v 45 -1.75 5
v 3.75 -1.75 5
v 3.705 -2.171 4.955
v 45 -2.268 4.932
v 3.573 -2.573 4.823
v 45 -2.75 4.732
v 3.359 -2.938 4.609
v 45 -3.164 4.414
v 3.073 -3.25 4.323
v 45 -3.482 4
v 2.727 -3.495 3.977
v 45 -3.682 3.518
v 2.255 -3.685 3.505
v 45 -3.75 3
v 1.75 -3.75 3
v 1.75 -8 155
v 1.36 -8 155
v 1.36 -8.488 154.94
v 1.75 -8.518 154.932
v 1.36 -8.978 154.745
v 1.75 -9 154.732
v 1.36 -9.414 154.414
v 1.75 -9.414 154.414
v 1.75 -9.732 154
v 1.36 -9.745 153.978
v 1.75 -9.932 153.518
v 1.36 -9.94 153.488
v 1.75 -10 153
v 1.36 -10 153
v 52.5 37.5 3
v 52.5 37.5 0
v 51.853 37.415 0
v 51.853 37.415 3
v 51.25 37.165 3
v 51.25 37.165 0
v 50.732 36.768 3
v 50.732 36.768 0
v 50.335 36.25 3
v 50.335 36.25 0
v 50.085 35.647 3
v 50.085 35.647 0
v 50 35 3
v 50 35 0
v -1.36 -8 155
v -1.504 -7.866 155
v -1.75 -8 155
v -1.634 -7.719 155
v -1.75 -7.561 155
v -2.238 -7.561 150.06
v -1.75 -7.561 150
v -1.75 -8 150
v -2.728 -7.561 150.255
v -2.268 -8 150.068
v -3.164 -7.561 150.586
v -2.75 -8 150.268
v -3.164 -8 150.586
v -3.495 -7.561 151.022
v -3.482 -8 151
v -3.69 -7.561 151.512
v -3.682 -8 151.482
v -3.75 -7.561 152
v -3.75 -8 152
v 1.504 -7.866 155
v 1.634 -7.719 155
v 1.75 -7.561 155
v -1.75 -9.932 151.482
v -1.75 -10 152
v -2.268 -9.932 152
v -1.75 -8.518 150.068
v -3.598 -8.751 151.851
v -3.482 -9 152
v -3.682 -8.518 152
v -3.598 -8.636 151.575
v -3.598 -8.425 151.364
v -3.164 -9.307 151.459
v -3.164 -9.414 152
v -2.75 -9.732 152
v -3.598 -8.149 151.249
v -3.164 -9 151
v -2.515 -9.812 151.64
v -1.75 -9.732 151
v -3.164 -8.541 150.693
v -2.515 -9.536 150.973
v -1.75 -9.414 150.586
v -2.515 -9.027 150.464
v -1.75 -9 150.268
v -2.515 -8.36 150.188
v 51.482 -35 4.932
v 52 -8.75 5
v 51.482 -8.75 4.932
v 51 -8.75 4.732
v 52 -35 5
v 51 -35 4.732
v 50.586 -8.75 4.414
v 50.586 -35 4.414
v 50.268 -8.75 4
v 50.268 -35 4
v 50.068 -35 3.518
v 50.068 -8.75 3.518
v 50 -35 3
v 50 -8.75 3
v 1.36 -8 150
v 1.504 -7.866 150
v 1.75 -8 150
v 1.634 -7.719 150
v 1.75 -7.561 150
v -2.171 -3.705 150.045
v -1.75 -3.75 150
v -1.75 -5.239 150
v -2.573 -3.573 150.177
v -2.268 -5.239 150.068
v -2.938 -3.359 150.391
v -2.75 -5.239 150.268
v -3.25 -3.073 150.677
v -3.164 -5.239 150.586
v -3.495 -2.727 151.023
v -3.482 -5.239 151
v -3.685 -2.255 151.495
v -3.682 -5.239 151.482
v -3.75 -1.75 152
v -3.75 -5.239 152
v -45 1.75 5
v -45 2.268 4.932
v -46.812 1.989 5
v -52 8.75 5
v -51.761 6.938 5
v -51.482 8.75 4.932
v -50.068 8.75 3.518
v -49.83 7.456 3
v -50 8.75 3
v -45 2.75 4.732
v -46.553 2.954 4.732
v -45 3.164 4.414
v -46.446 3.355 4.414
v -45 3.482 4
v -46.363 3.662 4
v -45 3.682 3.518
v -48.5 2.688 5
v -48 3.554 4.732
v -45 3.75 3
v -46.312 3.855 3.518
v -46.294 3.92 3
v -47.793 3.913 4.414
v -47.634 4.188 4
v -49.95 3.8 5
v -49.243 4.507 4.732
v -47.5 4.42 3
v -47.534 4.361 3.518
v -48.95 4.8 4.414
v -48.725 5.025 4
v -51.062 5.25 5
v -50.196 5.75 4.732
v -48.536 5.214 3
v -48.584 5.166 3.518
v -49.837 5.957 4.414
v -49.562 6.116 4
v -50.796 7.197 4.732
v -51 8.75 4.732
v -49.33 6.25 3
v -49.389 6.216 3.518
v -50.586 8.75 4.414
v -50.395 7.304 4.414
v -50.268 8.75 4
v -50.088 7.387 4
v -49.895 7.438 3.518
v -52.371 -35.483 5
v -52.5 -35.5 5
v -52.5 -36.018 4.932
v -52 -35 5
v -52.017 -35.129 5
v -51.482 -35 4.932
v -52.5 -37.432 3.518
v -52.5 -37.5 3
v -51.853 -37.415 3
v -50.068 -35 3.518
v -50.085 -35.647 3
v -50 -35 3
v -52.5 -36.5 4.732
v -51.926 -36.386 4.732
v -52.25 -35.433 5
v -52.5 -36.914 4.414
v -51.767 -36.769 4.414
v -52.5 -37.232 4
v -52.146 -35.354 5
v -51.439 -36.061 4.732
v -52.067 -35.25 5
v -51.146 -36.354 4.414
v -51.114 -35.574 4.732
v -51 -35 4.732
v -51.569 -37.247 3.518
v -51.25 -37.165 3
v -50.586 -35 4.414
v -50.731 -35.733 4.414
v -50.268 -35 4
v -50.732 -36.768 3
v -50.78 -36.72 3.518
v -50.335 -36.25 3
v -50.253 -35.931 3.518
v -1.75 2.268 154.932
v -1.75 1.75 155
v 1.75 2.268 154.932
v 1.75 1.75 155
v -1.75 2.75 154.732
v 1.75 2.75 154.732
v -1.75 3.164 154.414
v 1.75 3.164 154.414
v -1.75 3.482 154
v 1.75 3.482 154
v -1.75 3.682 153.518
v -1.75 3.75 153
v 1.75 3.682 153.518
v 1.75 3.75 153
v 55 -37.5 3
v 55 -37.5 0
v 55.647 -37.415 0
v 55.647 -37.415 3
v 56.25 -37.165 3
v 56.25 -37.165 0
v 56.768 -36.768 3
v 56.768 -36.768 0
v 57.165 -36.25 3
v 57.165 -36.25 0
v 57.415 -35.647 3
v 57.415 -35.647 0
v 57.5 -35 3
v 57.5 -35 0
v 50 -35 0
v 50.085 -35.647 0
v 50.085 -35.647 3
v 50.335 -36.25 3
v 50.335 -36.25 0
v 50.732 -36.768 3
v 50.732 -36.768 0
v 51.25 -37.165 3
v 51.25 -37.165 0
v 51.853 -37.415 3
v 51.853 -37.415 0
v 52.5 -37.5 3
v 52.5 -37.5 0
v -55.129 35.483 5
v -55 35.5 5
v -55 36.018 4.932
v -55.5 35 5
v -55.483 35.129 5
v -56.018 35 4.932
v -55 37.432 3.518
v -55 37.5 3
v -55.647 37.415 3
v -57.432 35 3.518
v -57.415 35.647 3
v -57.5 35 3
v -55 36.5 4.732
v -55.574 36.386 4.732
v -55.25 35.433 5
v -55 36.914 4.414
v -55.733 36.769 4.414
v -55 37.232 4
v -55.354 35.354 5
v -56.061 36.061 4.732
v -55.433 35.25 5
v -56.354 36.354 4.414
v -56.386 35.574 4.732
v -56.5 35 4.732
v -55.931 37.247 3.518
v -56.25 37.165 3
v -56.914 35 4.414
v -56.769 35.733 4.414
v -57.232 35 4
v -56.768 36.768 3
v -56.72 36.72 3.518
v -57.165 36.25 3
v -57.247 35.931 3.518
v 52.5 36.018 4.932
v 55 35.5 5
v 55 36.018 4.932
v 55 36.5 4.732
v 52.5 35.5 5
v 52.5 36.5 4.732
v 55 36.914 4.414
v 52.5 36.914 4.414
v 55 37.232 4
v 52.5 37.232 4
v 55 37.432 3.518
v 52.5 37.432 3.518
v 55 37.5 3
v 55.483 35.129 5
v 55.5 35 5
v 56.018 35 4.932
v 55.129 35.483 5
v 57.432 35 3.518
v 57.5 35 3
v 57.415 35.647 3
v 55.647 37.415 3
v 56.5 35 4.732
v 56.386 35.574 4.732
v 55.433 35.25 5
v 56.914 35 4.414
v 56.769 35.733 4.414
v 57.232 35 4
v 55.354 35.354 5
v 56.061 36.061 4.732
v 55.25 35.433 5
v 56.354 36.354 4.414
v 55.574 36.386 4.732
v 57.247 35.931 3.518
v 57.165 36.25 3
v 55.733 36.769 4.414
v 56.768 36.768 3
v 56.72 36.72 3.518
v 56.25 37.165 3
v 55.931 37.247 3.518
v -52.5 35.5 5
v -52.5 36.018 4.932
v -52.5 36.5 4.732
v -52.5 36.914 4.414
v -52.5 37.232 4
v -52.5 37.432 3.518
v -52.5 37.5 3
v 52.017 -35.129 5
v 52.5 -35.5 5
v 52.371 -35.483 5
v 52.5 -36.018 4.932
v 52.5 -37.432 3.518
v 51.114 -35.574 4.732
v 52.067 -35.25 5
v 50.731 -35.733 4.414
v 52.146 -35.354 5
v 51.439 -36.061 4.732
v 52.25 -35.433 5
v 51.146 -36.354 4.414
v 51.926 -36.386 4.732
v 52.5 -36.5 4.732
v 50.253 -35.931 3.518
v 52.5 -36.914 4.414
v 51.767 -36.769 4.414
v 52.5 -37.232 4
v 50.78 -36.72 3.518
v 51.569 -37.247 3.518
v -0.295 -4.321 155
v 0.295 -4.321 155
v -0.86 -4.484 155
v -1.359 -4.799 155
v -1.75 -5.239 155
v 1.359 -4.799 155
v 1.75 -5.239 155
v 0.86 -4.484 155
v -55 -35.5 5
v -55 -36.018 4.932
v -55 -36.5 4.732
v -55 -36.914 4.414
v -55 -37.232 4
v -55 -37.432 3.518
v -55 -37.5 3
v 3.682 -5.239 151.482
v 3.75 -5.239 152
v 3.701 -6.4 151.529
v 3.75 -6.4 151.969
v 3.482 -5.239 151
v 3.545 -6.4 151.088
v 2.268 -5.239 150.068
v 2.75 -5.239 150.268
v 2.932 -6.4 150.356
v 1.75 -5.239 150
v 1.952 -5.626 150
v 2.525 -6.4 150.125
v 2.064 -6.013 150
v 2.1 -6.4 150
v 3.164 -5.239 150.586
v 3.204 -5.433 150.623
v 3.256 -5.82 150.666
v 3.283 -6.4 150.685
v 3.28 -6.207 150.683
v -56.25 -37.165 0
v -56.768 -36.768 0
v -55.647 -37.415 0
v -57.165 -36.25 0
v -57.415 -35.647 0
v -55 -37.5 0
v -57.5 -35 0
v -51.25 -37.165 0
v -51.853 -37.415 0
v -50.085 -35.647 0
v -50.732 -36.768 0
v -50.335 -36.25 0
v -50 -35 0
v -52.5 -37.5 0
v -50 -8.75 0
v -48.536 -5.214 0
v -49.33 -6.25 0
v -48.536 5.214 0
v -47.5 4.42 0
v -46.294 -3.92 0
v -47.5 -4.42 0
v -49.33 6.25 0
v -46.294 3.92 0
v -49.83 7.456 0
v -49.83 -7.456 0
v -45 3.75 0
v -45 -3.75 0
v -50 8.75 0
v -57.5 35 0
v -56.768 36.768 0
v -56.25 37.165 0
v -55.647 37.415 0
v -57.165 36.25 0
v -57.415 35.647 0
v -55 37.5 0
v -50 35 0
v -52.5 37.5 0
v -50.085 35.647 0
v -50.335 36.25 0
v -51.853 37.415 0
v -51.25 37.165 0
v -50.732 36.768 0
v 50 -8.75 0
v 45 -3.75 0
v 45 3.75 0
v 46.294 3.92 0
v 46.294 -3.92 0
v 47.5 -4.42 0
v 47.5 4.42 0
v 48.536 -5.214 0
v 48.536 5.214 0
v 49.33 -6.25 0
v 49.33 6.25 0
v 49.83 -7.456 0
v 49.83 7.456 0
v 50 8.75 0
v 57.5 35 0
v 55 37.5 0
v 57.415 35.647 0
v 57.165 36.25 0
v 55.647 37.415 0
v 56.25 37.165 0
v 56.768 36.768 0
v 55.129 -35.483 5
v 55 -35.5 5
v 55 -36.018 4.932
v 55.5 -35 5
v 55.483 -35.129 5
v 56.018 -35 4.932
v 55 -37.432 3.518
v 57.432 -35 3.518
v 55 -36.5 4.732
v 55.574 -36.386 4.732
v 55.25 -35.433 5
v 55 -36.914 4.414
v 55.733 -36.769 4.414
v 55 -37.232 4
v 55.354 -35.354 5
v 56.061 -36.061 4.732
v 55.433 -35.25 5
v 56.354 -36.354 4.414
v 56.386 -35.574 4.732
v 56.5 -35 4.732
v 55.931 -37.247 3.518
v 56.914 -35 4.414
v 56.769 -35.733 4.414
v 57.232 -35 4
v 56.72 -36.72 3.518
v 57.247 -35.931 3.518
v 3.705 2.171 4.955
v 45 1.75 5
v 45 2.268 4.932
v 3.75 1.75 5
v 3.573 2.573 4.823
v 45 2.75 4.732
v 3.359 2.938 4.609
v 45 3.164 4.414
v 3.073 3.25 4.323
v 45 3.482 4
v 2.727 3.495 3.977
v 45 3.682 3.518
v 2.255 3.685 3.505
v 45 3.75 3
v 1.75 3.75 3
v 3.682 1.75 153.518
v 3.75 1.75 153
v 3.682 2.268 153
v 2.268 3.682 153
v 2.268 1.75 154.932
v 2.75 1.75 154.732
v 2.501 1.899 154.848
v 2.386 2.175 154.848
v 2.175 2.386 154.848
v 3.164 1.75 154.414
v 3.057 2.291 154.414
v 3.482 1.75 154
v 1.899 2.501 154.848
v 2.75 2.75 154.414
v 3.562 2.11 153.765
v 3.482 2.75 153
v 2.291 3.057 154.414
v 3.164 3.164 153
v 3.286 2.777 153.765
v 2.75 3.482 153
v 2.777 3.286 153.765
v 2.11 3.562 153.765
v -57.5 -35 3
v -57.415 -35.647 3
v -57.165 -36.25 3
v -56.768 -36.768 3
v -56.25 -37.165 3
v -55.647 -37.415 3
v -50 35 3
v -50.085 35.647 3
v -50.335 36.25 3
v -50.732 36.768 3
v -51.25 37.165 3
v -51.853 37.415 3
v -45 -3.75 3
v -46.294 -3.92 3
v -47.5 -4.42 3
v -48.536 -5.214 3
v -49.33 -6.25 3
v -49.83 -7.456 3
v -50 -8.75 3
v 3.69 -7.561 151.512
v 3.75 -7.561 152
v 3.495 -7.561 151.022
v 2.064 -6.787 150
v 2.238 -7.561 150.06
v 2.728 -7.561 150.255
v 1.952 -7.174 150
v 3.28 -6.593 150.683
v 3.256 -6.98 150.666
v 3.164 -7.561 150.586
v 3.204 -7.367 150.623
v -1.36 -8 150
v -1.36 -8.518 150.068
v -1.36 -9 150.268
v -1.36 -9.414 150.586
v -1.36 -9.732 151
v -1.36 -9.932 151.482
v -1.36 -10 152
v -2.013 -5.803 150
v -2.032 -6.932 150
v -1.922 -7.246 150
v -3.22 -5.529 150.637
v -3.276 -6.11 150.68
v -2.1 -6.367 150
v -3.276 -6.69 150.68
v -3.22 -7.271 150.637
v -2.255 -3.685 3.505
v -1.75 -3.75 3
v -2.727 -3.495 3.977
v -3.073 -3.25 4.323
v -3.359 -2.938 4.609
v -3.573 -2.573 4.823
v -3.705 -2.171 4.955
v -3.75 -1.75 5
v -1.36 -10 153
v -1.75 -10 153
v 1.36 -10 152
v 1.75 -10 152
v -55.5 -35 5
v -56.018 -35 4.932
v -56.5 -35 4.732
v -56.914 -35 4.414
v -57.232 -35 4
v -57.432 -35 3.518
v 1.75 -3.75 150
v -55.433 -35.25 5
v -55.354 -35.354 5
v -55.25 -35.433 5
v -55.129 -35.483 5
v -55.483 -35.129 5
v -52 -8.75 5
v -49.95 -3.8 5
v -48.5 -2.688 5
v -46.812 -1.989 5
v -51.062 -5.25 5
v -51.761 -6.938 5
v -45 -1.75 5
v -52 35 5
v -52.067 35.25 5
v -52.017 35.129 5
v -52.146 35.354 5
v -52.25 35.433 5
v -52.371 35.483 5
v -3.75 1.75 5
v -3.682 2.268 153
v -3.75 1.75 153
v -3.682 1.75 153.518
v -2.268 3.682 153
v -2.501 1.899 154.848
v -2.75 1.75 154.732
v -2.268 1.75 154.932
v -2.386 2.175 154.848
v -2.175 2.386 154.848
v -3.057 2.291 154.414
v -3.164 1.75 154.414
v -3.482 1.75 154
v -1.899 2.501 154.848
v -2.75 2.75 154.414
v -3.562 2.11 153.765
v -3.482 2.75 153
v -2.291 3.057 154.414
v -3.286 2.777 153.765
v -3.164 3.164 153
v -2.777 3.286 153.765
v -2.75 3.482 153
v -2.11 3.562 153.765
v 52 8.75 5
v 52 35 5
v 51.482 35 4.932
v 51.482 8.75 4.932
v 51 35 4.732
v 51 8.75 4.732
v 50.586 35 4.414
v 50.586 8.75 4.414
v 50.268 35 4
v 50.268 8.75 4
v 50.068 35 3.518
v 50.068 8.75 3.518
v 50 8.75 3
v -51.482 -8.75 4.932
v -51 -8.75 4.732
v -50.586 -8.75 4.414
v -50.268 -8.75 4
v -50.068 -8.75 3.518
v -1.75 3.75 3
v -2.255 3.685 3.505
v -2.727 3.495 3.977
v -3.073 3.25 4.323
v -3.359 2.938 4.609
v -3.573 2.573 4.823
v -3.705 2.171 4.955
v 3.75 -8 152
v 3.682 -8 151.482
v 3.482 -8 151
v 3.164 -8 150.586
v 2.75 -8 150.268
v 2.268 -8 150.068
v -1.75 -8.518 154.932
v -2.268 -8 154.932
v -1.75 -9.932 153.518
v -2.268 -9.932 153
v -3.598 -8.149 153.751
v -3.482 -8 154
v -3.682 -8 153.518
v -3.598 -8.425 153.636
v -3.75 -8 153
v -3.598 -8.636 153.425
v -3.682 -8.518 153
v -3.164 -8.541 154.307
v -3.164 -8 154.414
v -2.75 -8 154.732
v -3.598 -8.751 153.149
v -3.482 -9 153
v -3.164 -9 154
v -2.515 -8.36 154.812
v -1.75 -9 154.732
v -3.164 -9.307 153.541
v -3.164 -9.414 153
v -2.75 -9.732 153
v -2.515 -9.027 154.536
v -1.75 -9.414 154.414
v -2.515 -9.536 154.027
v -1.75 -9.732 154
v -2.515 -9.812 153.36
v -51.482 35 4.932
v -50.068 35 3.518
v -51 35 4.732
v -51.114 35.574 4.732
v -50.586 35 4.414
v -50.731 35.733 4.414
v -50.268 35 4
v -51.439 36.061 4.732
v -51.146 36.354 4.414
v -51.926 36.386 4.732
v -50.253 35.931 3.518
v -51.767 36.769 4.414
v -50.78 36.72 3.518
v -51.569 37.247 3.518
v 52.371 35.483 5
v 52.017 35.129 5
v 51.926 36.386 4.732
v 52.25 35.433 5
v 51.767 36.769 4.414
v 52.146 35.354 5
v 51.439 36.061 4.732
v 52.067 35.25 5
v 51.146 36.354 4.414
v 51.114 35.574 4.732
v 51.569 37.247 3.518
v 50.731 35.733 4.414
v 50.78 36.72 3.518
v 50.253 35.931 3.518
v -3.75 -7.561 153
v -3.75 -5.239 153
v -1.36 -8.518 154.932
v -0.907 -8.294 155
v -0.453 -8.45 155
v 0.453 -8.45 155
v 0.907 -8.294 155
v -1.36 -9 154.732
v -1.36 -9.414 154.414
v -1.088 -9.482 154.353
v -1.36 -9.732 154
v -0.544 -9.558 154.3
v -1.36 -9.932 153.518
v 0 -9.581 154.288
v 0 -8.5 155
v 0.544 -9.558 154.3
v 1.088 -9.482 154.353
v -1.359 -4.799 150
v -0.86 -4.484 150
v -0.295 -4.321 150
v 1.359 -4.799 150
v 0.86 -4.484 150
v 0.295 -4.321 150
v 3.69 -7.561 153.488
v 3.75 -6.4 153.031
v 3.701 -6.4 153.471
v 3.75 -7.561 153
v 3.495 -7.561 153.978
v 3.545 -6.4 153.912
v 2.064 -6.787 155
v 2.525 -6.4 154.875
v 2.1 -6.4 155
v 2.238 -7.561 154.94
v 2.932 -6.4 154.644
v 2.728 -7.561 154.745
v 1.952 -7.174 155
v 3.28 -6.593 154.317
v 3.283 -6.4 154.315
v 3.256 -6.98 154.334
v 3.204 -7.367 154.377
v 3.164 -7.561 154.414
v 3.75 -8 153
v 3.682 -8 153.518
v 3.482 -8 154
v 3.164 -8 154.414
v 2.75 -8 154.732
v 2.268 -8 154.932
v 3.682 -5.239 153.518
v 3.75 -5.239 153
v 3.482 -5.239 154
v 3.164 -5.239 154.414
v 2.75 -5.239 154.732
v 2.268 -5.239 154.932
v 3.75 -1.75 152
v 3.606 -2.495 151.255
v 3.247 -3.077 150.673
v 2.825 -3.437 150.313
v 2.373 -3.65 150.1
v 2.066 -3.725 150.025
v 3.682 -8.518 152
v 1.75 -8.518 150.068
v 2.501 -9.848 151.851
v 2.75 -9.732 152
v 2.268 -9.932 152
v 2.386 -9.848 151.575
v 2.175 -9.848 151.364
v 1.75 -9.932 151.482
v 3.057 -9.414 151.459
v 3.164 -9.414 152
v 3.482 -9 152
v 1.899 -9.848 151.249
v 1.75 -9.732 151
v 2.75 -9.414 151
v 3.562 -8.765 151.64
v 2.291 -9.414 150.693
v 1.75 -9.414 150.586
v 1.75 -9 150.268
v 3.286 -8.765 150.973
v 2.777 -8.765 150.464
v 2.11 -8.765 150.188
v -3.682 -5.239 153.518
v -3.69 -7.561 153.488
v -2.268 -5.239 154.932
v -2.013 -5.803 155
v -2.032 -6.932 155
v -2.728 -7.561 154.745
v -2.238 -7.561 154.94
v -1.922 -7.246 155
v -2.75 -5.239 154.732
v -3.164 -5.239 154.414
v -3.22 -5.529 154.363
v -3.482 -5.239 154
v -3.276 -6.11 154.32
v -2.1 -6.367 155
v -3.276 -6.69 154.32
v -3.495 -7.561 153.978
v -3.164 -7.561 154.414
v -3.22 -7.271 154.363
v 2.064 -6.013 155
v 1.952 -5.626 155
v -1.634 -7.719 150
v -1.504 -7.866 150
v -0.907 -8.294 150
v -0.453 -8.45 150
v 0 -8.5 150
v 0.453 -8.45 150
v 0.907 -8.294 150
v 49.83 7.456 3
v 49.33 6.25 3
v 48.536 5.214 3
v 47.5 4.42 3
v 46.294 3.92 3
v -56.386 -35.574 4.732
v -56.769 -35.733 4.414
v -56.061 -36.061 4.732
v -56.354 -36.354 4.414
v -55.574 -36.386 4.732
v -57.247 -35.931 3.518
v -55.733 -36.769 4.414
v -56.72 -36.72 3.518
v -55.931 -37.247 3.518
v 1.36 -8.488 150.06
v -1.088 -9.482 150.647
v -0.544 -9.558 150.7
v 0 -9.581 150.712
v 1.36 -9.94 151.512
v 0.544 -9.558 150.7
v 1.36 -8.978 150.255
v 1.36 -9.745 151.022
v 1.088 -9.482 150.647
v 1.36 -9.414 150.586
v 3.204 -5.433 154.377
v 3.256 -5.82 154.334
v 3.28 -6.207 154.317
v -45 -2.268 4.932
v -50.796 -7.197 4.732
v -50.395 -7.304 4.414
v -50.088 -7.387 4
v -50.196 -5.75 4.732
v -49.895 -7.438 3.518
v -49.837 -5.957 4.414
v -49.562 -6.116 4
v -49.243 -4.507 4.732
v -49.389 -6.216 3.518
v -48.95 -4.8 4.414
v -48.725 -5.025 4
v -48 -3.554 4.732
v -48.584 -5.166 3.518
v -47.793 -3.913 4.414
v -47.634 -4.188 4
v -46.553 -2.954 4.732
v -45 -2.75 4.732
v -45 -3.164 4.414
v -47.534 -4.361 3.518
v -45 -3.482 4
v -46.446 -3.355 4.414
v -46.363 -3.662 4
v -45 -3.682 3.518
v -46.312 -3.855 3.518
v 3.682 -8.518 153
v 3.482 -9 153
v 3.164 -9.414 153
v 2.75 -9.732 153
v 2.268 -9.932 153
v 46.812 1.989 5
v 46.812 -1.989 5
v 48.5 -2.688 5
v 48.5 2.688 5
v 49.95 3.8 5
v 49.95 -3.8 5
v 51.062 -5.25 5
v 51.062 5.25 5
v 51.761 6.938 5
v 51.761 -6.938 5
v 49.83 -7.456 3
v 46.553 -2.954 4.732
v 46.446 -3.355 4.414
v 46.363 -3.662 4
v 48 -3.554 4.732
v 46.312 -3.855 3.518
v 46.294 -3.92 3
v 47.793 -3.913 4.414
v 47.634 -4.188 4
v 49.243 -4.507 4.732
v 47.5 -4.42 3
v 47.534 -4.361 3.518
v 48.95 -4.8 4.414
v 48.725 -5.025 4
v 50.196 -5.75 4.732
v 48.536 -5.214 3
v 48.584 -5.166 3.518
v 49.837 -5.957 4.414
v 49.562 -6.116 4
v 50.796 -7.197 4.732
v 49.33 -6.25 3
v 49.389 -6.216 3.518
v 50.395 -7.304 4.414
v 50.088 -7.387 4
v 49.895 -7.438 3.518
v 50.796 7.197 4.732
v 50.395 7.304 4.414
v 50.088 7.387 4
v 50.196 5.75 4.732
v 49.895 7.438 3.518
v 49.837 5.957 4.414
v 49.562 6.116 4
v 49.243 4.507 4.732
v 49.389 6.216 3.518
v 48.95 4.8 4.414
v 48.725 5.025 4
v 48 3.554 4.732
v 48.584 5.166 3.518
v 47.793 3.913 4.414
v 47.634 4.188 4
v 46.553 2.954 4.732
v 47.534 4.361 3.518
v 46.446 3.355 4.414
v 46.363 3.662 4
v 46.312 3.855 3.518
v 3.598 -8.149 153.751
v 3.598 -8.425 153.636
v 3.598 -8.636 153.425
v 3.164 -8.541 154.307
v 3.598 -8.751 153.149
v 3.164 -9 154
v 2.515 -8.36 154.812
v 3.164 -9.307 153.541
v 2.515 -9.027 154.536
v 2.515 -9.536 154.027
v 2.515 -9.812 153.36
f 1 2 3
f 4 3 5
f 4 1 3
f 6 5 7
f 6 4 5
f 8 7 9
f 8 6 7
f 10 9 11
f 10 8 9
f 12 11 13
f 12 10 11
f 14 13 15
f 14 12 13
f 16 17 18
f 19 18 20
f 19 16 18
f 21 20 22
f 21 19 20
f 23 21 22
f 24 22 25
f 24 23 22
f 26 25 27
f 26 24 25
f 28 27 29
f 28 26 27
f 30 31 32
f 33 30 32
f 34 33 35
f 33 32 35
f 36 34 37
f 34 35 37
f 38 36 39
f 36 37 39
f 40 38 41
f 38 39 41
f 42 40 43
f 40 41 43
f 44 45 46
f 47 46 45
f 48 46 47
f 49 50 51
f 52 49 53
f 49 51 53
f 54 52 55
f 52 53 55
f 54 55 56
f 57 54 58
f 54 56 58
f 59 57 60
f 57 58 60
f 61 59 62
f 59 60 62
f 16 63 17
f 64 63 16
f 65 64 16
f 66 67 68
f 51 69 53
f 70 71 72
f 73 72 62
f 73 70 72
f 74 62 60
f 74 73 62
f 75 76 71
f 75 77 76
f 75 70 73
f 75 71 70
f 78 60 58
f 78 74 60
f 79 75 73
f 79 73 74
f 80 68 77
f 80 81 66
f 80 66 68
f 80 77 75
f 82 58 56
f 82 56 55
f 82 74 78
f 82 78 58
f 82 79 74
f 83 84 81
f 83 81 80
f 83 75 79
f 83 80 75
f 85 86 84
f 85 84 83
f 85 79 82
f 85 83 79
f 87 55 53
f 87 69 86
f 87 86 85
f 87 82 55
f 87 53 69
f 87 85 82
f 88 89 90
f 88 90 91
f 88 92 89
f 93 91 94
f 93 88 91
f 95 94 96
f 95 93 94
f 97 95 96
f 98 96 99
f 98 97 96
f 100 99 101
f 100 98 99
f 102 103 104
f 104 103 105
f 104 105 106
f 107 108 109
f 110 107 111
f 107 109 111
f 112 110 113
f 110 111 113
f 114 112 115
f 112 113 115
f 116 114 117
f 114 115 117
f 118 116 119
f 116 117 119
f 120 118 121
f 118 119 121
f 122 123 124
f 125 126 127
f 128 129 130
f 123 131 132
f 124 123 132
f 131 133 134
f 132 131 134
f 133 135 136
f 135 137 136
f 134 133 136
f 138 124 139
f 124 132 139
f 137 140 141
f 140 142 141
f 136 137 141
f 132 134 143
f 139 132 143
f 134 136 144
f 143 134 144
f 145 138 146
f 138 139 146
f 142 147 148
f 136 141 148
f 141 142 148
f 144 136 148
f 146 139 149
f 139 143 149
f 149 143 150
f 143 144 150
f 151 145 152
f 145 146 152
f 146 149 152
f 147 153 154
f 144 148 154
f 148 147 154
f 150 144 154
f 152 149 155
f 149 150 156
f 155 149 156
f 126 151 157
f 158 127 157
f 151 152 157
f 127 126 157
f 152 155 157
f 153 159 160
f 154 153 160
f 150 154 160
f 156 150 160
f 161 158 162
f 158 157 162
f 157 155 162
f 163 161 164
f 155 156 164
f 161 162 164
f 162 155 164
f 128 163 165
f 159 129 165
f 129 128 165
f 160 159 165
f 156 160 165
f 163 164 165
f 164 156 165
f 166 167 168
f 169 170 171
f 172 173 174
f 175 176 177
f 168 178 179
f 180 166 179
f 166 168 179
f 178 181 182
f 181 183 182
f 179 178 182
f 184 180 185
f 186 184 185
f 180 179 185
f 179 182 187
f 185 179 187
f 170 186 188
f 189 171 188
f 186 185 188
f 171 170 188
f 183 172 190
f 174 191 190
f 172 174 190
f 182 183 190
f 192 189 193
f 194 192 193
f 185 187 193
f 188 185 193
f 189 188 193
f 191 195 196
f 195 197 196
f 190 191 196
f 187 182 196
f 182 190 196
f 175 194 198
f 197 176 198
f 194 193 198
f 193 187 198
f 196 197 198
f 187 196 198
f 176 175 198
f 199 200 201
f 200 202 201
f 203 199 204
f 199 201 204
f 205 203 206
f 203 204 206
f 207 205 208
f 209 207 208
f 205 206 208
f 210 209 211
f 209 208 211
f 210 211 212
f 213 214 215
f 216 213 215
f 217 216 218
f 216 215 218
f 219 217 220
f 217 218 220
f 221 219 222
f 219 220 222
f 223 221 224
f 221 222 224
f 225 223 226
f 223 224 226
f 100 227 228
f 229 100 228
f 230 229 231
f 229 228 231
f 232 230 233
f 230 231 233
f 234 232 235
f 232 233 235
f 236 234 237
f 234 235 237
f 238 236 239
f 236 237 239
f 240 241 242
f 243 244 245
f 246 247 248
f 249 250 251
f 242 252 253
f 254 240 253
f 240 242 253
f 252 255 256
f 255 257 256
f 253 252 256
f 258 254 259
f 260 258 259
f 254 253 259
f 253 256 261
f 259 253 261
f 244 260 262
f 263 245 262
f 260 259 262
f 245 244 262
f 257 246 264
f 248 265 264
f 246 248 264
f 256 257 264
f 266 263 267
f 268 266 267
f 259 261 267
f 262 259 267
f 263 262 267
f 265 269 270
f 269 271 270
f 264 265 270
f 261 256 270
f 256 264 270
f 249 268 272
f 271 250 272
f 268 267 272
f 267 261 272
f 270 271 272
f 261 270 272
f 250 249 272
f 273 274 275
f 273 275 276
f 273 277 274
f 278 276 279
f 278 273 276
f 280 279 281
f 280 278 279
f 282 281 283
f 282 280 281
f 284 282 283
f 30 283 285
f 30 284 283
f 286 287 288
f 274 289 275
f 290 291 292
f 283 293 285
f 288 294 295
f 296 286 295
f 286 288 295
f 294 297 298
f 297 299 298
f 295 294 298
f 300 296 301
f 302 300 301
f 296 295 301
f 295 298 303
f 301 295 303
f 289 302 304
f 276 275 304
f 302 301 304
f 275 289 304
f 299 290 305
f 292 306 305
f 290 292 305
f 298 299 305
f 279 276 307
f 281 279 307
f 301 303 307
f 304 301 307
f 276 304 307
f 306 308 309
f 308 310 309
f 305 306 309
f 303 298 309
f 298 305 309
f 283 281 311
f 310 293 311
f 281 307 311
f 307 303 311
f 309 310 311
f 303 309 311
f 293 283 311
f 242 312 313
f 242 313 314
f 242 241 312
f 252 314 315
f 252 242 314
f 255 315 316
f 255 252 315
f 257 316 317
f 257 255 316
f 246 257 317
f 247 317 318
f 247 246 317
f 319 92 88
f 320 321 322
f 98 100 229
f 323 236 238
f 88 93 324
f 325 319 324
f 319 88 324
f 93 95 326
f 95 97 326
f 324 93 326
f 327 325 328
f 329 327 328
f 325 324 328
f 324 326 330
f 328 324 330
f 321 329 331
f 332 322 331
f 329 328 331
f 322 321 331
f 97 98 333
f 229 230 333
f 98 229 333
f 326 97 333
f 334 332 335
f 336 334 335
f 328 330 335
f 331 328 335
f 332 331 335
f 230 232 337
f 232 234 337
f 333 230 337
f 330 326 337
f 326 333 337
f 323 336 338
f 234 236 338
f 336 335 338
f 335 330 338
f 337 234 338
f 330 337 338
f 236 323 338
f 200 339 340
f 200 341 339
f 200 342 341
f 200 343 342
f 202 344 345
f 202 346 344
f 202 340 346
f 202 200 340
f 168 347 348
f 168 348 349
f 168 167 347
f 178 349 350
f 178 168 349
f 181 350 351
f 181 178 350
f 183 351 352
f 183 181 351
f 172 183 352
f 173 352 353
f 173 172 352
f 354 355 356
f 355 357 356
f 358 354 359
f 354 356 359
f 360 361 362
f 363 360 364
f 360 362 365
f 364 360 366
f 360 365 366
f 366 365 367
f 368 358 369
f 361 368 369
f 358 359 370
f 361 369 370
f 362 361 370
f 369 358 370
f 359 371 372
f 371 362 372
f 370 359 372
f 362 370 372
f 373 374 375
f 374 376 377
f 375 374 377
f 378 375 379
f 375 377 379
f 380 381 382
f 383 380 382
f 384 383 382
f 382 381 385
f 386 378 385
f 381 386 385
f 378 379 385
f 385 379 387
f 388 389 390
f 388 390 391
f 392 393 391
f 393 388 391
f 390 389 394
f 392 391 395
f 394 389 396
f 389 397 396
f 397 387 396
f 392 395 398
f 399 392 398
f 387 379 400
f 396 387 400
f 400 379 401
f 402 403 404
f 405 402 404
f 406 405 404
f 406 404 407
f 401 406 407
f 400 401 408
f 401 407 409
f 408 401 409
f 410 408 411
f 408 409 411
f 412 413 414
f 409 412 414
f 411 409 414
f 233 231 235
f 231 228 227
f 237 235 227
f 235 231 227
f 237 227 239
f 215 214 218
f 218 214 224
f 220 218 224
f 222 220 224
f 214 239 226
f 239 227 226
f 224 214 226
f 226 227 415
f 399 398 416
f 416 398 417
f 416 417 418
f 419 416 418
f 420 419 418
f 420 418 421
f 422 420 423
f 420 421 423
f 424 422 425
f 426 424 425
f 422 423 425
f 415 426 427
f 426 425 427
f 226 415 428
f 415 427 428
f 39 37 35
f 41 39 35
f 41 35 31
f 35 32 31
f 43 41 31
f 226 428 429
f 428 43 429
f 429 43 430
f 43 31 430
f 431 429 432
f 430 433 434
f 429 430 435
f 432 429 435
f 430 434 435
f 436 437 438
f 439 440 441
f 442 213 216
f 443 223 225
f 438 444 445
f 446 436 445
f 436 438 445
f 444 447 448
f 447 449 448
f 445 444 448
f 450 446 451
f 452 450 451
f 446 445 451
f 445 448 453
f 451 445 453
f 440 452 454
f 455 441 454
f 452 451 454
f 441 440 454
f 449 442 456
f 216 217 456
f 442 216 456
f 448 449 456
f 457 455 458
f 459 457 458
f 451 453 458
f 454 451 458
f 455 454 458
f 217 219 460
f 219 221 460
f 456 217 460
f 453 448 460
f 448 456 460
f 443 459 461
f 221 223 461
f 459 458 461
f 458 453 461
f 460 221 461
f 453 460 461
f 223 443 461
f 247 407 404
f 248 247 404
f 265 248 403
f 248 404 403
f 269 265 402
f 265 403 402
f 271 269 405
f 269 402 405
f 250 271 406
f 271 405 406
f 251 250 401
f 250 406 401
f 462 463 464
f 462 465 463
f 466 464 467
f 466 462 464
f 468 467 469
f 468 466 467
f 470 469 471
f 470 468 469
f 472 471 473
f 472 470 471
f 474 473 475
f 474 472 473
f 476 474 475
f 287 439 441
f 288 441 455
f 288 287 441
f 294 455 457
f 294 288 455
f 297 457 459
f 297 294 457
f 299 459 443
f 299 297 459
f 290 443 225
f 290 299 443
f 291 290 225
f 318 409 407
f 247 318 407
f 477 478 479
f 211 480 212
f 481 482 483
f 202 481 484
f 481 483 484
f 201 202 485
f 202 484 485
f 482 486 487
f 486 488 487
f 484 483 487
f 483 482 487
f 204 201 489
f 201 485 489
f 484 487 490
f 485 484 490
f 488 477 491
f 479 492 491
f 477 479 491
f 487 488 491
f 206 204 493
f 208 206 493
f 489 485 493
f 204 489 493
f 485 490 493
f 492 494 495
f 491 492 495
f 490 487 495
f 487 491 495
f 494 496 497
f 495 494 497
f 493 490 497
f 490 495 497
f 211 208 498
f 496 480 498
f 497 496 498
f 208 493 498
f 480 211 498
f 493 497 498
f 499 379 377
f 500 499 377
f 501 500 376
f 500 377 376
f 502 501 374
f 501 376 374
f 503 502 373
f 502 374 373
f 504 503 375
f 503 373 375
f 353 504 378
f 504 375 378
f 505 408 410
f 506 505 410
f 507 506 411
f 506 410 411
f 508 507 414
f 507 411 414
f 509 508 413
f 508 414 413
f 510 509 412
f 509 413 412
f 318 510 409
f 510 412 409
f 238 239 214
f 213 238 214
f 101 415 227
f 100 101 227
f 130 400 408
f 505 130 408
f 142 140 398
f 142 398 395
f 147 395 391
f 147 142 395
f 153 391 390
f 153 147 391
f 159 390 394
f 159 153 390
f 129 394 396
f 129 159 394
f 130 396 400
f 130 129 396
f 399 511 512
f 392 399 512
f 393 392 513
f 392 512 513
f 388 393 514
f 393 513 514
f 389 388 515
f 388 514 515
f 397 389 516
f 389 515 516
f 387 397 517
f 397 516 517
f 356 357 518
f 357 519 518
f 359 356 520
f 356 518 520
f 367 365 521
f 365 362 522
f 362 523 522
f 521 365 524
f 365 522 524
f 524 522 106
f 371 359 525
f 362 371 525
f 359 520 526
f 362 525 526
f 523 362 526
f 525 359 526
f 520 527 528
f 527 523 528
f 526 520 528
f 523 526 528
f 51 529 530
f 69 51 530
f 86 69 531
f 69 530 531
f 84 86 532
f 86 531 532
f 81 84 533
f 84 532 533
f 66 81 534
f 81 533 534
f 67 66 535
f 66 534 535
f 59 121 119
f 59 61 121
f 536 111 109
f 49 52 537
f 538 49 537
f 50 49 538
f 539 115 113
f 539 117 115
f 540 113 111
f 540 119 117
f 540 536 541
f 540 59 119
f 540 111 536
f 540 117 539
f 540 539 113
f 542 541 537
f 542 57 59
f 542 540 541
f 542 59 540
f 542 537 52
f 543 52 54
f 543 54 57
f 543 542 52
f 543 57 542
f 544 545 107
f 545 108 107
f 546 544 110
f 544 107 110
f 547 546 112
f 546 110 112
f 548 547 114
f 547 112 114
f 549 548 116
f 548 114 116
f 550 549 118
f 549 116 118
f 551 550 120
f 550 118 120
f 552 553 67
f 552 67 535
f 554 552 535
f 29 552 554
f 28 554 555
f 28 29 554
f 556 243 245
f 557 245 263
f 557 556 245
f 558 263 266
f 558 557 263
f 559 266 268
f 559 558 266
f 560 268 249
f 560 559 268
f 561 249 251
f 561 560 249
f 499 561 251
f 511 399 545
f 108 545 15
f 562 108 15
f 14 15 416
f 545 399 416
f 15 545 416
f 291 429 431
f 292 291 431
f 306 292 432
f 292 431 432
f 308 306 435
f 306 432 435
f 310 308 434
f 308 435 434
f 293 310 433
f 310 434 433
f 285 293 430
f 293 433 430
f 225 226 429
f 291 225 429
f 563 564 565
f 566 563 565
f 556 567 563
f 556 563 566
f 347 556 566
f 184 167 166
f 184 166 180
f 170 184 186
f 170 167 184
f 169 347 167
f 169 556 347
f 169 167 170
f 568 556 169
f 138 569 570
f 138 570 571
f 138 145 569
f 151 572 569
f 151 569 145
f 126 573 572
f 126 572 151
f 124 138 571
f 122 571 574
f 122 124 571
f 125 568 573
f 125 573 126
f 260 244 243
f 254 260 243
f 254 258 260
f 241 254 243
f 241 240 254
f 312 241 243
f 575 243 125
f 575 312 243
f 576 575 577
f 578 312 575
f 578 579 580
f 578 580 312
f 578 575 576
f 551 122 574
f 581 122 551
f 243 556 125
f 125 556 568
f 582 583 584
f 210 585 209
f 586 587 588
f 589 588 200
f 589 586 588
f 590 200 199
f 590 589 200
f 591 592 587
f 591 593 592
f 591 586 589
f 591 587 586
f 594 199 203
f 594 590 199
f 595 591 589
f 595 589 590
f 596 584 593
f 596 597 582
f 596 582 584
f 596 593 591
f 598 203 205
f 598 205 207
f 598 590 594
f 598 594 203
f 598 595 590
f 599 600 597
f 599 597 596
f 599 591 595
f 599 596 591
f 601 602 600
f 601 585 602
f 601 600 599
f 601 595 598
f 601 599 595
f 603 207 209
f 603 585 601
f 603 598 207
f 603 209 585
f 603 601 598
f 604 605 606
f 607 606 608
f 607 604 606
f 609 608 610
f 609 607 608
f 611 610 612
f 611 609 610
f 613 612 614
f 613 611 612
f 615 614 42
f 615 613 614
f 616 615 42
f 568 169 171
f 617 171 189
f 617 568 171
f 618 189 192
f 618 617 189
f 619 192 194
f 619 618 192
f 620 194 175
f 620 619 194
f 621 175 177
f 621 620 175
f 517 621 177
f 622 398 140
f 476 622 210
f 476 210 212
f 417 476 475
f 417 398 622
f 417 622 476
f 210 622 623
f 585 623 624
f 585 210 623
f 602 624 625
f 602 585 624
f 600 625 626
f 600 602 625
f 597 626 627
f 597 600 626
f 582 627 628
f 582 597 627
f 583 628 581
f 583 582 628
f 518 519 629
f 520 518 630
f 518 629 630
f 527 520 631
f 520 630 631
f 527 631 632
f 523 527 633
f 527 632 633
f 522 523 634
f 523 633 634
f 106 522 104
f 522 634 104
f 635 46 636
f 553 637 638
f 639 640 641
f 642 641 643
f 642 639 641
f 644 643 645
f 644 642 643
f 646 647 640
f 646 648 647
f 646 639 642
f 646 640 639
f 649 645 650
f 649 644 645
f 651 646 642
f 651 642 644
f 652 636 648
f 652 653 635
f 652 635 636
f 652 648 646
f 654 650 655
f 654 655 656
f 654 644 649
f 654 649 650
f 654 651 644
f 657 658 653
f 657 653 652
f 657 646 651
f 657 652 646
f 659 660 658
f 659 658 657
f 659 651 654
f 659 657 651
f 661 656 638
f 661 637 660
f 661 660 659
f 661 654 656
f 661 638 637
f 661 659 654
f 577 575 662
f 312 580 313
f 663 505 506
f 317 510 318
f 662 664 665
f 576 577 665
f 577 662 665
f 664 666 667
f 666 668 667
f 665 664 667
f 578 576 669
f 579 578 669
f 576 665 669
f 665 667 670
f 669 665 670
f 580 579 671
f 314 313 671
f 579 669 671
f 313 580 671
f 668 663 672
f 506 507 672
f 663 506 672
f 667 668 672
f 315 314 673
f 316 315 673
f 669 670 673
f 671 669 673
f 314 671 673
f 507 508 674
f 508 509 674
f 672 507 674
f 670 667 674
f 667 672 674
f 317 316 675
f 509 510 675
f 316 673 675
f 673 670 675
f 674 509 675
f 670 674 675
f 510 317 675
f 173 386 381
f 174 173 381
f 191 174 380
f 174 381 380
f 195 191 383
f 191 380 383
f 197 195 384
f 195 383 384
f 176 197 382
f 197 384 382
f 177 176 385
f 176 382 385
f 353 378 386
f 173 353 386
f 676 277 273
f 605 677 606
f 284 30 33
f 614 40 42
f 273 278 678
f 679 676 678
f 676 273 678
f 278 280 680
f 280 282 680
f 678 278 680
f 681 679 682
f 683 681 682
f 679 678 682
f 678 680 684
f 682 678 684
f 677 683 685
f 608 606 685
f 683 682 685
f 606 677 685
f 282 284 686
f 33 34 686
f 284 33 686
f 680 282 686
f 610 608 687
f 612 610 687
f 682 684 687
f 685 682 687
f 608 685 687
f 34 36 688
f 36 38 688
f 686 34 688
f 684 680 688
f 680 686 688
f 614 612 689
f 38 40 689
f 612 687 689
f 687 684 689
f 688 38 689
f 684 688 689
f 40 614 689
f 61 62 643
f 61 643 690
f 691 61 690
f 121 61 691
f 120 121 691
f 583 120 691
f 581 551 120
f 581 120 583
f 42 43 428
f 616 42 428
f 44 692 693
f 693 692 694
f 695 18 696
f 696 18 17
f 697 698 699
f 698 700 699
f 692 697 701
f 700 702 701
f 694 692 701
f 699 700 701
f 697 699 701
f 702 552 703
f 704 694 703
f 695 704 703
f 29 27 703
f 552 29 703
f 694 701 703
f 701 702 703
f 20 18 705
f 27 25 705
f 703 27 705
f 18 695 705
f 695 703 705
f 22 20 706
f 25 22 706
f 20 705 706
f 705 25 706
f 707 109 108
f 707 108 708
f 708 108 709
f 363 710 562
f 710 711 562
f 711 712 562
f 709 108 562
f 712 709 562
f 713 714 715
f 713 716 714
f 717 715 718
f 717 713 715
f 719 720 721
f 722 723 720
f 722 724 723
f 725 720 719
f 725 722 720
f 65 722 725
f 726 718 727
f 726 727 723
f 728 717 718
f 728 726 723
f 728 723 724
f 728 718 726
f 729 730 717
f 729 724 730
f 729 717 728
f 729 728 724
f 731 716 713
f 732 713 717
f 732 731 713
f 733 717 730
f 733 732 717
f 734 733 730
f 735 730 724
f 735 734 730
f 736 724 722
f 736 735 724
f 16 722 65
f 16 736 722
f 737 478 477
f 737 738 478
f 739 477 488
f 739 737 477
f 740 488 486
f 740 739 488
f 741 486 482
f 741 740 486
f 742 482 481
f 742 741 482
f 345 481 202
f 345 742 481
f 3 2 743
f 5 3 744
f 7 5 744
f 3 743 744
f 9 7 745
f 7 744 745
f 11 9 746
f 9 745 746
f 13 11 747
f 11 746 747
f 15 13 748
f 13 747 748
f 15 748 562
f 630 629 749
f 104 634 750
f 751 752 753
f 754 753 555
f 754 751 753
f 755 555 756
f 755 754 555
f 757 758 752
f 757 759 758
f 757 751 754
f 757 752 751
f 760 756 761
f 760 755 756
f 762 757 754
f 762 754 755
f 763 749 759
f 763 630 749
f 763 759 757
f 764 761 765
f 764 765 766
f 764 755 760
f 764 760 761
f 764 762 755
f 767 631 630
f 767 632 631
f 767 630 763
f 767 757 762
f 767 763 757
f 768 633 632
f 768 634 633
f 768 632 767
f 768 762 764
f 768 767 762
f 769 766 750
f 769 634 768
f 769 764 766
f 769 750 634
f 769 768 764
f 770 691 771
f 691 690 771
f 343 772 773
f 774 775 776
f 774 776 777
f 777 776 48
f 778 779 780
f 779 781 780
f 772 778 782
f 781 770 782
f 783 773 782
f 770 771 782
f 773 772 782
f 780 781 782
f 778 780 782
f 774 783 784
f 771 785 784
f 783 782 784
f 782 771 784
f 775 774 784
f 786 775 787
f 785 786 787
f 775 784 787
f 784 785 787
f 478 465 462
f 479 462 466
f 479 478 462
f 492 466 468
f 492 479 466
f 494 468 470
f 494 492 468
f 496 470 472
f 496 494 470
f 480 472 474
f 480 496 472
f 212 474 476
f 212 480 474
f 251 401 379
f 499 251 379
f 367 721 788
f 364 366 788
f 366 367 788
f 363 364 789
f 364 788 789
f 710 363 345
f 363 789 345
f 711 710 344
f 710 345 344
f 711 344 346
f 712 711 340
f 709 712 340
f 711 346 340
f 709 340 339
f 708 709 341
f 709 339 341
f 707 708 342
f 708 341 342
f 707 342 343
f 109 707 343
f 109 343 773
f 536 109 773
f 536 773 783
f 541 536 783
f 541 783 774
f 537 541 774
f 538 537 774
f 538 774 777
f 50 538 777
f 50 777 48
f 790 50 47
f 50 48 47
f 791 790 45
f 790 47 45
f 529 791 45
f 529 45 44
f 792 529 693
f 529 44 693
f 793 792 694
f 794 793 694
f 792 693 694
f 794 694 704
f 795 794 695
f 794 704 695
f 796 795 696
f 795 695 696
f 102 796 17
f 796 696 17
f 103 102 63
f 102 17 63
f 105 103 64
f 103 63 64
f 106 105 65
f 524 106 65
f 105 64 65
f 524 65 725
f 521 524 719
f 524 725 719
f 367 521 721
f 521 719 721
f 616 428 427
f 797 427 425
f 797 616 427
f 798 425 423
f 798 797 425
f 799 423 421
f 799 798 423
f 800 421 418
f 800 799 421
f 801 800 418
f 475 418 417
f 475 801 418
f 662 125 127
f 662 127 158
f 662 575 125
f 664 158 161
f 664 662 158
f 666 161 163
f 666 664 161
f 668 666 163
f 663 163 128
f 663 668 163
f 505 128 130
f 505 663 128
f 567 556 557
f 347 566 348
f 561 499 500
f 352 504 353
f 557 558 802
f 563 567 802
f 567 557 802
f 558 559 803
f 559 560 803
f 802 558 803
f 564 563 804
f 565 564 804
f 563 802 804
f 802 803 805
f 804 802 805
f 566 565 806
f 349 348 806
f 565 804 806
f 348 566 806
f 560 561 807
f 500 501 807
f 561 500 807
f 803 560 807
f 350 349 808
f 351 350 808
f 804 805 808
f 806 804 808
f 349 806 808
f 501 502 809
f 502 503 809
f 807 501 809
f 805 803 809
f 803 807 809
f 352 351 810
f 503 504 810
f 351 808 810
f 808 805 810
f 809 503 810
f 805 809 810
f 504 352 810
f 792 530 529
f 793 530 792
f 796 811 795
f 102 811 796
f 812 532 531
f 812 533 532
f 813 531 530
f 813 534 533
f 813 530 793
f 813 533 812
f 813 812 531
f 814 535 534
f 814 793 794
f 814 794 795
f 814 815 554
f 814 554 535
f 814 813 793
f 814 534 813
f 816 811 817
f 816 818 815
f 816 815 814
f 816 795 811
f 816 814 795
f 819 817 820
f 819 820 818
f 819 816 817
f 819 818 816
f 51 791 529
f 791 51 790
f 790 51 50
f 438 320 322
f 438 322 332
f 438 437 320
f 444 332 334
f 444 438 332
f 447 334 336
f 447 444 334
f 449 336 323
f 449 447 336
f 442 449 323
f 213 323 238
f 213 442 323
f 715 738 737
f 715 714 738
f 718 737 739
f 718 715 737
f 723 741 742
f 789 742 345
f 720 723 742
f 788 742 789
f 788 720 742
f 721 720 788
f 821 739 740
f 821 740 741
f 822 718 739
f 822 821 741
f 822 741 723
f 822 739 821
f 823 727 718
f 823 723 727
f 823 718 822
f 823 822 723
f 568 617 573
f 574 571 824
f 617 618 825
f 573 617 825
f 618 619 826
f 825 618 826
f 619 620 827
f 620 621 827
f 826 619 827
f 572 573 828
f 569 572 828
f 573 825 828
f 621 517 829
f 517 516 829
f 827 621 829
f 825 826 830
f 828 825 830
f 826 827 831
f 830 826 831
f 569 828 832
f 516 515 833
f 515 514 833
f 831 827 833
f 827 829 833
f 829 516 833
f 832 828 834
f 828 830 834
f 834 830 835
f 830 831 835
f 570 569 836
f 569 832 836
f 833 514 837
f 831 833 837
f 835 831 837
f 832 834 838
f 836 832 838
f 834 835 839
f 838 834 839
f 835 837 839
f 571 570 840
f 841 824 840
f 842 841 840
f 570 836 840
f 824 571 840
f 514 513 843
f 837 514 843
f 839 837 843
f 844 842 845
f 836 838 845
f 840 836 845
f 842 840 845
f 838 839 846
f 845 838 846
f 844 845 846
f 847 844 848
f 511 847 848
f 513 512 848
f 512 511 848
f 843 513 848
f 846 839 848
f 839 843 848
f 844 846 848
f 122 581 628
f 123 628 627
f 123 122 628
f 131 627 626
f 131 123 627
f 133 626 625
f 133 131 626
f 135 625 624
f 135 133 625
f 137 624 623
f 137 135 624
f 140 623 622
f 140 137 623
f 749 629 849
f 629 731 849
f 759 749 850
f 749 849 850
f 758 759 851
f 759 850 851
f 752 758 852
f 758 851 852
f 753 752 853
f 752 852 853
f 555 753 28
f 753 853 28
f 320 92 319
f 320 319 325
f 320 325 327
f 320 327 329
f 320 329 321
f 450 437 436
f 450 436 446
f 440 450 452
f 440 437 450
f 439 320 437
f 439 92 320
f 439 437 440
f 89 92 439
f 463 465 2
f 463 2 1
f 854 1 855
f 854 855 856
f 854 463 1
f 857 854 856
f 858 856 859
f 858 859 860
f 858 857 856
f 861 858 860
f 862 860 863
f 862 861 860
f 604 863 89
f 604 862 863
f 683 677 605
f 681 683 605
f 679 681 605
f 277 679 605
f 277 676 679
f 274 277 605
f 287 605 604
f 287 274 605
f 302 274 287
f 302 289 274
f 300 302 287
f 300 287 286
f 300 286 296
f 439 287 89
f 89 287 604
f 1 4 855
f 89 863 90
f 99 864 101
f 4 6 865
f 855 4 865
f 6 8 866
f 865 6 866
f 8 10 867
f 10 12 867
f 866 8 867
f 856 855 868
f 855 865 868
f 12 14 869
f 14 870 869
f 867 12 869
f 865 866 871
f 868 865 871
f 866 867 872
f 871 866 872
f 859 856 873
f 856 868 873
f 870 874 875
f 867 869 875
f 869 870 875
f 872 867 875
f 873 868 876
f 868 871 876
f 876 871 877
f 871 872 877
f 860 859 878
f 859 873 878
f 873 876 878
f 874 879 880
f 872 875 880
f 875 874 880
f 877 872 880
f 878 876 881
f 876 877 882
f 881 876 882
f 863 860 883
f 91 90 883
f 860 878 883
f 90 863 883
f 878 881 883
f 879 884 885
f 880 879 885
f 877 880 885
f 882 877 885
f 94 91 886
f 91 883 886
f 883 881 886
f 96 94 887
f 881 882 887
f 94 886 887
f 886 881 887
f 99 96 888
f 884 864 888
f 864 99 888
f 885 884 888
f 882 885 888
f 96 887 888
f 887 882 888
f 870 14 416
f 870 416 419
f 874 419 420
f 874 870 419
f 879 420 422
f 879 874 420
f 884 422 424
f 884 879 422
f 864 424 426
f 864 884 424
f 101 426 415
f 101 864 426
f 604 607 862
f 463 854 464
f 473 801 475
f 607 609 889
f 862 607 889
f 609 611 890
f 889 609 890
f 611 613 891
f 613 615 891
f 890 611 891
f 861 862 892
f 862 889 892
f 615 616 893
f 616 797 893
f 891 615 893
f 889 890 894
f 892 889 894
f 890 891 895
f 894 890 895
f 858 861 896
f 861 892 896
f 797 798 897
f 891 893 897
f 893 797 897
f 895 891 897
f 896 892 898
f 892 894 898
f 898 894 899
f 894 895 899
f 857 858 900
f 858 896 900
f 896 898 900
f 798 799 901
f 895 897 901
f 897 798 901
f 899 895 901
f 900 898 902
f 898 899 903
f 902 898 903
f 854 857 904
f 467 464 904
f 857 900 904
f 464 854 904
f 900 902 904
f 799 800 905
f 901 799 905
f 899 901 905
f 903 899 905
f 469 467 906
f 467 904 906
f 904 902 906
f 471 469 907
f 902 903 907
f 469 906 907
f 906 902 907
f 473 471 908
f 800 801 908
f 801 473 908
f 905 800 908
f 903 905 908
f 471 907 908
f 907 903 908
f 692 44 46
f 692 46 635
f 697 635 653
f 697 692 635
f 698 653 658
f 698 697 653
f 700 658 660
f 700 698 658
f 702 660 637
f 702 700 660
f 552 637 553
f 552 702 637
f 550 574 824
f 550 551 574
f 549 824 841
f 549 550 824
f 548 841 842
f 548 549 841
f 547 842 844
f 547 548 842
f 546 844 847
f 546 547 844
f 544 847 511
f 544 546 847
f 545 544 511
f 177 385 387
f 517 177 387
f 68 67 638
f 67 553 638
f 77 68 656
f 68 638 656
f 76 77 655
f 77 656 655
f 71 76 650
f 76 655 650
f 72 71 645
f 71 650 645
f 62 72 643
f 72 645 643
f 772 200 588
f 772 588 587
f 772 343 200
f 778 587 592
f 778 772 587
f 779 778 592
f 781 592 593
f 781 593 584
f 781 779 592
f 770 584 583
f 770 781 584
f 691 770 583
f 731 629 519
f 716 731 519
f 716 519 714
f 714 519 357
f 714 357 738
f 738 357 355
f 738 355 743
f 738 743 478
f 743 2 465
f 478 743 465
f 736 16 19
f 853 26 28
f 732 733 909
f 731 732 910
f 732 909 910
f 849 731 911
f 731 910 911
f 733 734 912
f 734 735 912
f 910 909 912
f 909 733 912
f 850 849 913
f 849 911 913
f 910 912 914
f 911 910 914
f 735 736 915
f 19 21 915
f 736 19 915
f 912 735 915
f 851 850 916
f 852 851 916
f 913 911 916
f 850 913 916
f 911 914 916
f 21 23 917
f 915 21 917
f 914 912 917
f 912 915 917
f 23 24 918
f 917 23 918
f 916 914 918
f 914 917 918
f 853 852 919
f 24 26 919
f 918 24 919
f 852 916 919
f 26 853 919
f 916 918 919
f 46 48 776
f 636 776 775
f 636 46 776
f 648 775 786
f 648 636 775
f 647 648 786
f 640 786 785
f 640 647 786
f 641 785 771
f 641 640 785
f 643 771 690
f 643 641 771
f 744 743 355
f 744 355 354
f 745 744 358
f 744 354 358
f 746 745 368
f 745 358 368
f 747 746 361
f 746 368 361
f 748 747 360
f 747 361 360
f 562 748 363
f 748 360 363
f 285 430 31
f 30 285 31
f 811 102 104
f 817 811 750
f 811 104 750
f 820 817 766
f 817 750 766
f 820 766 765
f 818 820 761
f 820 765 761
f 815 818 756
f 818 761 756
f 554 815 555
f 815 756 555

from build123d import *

# Parameters (mm, degrees)
SKETCH_W     = 100
SKETCH_H     = 7.5
PAD_DEPTH    = 5
FILLET_R     = 5
SKETCH001_W  = 7.5
SKETCH001_H  = 7.5
PAD001_DEPTH = 150
SKETCH002_W  = 7.5
SKETCH002_H  = 5
PAD002_DEPTH = 10
SKETCH003_R  = 2.1
POCKET_DEPTH = 5
FILLET001_R  = 2


with BuildPart() as part:
    # Sketch → Pad (new body)
    with BuildSketch(Plane.XY):
        Rectangle(SKETCH_W, SKETCH_H)
        with BuildLine():
            Line((50, 35), (50, -35))
            ThreePointArc((50, -35), (50.732233, -36.767767), (52.5, -37.5))
            Line((52.5, -37.5), (55, -37.5))
            ThreePointArc((55, -37.5), (56.767767, -36.767767), (57.5, -35))
            Line((57.5, -35), (57.5, 35))
            ThreePointArc((57.5, 35), (56.767767, 36.767767), (55, 37.5))
            Line((55, 37.5), (52.5, 37.5))
            ThreePointArc((52.5, 37.5), (50.732233, 36.767767), (50, 35))
        make_face()
        with BuildLine():
            Line((-52.5, 37.5), (-55, 37.5))
            ThreePointArc((-55, 37.5), (-56.767767, 36.767767), (-57.5, 35))
            Line((-57.5, 35), (-57.5, -35))
            ThreePointArc((-57.5, -35), (-56.767767, -36.767767), (-55, -37.5))
            Line((-55, -37.5), (-52.5, -37.5))
            ThreePointArc((-52.5, -37.5), (-50.732233, -36.767767), (-50, -35))
            Line((-50, -35), (-50, 35))
            ThreePointArc((-50, 35), (-50.732233, 36.767767), (-52.5, 37.5))
        make_face()
    extrude(amount=PAD_DEPTH)

    # Fillet
    fillet_edges = [part.edges().sort_by_distance(p)[0] for p in [
        (-50, -3.75, 2.5),
        (50, -3.75, 2.5),
        (-50, 3.75, 2.5),
        (50, 3.75, 2.5),
    ]]
    fillet(fillet_edges, radius=FILLET_R)

    # Sketch001 (on Face5 of Fillet) → Pad001 (join)
    with BuildSketch(Plane.XY.offset(5)):
        Rectangle(SKETCH001_W, SKETCH001_H)
    extrude(amount=PAD001_DEPTH)

    # Sketch002 → Pad002 (join)
    with BuildSketch(Plane.XZ):
        with Locations((0, 152.5)):
            Rectangle(SKETCH002_W, SKETCH002_H)
    extrude(amount=PAD002_DEPTH)

    # Sketch003 (on Face32 of Pad002) → Pocket (cut)
    with BuildSketch(Plane.XY.offset(155)):
        with Locations((0, -6.4)):
            Circle(SKETCH003_R)
    extrude(amount=-POCKET_DEPTH, mode=Mode.SUBTRACT)

    # Fillet001
    fillet001_edges = [part.edges().sort_by_distance(p)[0] for p in [
        (-50, -21.875, 5),
        (-3.75, -3.75, 77.5),
        (24.375, -3.75, 5),
        (3.75, -3.75, 77.5),
        (-3.75, 3.75, 80),
        (3.75, 3.75, 80),
        (0, -10, 155),
        (3.75, -3.125, 155),
        (-3.75, -3.125, 155),
        (0, 3.75, 155),
        (3.75, -6.875, 150),
        (3.75, -10, 152.5),
        (0, -10, 150),
        (-3.75, -10, 152.5),
        (-3.75, -6.875, 150),
    ]]
    fillet(fillet001_edges, radius=FILLET001_R)


solid = part.part
